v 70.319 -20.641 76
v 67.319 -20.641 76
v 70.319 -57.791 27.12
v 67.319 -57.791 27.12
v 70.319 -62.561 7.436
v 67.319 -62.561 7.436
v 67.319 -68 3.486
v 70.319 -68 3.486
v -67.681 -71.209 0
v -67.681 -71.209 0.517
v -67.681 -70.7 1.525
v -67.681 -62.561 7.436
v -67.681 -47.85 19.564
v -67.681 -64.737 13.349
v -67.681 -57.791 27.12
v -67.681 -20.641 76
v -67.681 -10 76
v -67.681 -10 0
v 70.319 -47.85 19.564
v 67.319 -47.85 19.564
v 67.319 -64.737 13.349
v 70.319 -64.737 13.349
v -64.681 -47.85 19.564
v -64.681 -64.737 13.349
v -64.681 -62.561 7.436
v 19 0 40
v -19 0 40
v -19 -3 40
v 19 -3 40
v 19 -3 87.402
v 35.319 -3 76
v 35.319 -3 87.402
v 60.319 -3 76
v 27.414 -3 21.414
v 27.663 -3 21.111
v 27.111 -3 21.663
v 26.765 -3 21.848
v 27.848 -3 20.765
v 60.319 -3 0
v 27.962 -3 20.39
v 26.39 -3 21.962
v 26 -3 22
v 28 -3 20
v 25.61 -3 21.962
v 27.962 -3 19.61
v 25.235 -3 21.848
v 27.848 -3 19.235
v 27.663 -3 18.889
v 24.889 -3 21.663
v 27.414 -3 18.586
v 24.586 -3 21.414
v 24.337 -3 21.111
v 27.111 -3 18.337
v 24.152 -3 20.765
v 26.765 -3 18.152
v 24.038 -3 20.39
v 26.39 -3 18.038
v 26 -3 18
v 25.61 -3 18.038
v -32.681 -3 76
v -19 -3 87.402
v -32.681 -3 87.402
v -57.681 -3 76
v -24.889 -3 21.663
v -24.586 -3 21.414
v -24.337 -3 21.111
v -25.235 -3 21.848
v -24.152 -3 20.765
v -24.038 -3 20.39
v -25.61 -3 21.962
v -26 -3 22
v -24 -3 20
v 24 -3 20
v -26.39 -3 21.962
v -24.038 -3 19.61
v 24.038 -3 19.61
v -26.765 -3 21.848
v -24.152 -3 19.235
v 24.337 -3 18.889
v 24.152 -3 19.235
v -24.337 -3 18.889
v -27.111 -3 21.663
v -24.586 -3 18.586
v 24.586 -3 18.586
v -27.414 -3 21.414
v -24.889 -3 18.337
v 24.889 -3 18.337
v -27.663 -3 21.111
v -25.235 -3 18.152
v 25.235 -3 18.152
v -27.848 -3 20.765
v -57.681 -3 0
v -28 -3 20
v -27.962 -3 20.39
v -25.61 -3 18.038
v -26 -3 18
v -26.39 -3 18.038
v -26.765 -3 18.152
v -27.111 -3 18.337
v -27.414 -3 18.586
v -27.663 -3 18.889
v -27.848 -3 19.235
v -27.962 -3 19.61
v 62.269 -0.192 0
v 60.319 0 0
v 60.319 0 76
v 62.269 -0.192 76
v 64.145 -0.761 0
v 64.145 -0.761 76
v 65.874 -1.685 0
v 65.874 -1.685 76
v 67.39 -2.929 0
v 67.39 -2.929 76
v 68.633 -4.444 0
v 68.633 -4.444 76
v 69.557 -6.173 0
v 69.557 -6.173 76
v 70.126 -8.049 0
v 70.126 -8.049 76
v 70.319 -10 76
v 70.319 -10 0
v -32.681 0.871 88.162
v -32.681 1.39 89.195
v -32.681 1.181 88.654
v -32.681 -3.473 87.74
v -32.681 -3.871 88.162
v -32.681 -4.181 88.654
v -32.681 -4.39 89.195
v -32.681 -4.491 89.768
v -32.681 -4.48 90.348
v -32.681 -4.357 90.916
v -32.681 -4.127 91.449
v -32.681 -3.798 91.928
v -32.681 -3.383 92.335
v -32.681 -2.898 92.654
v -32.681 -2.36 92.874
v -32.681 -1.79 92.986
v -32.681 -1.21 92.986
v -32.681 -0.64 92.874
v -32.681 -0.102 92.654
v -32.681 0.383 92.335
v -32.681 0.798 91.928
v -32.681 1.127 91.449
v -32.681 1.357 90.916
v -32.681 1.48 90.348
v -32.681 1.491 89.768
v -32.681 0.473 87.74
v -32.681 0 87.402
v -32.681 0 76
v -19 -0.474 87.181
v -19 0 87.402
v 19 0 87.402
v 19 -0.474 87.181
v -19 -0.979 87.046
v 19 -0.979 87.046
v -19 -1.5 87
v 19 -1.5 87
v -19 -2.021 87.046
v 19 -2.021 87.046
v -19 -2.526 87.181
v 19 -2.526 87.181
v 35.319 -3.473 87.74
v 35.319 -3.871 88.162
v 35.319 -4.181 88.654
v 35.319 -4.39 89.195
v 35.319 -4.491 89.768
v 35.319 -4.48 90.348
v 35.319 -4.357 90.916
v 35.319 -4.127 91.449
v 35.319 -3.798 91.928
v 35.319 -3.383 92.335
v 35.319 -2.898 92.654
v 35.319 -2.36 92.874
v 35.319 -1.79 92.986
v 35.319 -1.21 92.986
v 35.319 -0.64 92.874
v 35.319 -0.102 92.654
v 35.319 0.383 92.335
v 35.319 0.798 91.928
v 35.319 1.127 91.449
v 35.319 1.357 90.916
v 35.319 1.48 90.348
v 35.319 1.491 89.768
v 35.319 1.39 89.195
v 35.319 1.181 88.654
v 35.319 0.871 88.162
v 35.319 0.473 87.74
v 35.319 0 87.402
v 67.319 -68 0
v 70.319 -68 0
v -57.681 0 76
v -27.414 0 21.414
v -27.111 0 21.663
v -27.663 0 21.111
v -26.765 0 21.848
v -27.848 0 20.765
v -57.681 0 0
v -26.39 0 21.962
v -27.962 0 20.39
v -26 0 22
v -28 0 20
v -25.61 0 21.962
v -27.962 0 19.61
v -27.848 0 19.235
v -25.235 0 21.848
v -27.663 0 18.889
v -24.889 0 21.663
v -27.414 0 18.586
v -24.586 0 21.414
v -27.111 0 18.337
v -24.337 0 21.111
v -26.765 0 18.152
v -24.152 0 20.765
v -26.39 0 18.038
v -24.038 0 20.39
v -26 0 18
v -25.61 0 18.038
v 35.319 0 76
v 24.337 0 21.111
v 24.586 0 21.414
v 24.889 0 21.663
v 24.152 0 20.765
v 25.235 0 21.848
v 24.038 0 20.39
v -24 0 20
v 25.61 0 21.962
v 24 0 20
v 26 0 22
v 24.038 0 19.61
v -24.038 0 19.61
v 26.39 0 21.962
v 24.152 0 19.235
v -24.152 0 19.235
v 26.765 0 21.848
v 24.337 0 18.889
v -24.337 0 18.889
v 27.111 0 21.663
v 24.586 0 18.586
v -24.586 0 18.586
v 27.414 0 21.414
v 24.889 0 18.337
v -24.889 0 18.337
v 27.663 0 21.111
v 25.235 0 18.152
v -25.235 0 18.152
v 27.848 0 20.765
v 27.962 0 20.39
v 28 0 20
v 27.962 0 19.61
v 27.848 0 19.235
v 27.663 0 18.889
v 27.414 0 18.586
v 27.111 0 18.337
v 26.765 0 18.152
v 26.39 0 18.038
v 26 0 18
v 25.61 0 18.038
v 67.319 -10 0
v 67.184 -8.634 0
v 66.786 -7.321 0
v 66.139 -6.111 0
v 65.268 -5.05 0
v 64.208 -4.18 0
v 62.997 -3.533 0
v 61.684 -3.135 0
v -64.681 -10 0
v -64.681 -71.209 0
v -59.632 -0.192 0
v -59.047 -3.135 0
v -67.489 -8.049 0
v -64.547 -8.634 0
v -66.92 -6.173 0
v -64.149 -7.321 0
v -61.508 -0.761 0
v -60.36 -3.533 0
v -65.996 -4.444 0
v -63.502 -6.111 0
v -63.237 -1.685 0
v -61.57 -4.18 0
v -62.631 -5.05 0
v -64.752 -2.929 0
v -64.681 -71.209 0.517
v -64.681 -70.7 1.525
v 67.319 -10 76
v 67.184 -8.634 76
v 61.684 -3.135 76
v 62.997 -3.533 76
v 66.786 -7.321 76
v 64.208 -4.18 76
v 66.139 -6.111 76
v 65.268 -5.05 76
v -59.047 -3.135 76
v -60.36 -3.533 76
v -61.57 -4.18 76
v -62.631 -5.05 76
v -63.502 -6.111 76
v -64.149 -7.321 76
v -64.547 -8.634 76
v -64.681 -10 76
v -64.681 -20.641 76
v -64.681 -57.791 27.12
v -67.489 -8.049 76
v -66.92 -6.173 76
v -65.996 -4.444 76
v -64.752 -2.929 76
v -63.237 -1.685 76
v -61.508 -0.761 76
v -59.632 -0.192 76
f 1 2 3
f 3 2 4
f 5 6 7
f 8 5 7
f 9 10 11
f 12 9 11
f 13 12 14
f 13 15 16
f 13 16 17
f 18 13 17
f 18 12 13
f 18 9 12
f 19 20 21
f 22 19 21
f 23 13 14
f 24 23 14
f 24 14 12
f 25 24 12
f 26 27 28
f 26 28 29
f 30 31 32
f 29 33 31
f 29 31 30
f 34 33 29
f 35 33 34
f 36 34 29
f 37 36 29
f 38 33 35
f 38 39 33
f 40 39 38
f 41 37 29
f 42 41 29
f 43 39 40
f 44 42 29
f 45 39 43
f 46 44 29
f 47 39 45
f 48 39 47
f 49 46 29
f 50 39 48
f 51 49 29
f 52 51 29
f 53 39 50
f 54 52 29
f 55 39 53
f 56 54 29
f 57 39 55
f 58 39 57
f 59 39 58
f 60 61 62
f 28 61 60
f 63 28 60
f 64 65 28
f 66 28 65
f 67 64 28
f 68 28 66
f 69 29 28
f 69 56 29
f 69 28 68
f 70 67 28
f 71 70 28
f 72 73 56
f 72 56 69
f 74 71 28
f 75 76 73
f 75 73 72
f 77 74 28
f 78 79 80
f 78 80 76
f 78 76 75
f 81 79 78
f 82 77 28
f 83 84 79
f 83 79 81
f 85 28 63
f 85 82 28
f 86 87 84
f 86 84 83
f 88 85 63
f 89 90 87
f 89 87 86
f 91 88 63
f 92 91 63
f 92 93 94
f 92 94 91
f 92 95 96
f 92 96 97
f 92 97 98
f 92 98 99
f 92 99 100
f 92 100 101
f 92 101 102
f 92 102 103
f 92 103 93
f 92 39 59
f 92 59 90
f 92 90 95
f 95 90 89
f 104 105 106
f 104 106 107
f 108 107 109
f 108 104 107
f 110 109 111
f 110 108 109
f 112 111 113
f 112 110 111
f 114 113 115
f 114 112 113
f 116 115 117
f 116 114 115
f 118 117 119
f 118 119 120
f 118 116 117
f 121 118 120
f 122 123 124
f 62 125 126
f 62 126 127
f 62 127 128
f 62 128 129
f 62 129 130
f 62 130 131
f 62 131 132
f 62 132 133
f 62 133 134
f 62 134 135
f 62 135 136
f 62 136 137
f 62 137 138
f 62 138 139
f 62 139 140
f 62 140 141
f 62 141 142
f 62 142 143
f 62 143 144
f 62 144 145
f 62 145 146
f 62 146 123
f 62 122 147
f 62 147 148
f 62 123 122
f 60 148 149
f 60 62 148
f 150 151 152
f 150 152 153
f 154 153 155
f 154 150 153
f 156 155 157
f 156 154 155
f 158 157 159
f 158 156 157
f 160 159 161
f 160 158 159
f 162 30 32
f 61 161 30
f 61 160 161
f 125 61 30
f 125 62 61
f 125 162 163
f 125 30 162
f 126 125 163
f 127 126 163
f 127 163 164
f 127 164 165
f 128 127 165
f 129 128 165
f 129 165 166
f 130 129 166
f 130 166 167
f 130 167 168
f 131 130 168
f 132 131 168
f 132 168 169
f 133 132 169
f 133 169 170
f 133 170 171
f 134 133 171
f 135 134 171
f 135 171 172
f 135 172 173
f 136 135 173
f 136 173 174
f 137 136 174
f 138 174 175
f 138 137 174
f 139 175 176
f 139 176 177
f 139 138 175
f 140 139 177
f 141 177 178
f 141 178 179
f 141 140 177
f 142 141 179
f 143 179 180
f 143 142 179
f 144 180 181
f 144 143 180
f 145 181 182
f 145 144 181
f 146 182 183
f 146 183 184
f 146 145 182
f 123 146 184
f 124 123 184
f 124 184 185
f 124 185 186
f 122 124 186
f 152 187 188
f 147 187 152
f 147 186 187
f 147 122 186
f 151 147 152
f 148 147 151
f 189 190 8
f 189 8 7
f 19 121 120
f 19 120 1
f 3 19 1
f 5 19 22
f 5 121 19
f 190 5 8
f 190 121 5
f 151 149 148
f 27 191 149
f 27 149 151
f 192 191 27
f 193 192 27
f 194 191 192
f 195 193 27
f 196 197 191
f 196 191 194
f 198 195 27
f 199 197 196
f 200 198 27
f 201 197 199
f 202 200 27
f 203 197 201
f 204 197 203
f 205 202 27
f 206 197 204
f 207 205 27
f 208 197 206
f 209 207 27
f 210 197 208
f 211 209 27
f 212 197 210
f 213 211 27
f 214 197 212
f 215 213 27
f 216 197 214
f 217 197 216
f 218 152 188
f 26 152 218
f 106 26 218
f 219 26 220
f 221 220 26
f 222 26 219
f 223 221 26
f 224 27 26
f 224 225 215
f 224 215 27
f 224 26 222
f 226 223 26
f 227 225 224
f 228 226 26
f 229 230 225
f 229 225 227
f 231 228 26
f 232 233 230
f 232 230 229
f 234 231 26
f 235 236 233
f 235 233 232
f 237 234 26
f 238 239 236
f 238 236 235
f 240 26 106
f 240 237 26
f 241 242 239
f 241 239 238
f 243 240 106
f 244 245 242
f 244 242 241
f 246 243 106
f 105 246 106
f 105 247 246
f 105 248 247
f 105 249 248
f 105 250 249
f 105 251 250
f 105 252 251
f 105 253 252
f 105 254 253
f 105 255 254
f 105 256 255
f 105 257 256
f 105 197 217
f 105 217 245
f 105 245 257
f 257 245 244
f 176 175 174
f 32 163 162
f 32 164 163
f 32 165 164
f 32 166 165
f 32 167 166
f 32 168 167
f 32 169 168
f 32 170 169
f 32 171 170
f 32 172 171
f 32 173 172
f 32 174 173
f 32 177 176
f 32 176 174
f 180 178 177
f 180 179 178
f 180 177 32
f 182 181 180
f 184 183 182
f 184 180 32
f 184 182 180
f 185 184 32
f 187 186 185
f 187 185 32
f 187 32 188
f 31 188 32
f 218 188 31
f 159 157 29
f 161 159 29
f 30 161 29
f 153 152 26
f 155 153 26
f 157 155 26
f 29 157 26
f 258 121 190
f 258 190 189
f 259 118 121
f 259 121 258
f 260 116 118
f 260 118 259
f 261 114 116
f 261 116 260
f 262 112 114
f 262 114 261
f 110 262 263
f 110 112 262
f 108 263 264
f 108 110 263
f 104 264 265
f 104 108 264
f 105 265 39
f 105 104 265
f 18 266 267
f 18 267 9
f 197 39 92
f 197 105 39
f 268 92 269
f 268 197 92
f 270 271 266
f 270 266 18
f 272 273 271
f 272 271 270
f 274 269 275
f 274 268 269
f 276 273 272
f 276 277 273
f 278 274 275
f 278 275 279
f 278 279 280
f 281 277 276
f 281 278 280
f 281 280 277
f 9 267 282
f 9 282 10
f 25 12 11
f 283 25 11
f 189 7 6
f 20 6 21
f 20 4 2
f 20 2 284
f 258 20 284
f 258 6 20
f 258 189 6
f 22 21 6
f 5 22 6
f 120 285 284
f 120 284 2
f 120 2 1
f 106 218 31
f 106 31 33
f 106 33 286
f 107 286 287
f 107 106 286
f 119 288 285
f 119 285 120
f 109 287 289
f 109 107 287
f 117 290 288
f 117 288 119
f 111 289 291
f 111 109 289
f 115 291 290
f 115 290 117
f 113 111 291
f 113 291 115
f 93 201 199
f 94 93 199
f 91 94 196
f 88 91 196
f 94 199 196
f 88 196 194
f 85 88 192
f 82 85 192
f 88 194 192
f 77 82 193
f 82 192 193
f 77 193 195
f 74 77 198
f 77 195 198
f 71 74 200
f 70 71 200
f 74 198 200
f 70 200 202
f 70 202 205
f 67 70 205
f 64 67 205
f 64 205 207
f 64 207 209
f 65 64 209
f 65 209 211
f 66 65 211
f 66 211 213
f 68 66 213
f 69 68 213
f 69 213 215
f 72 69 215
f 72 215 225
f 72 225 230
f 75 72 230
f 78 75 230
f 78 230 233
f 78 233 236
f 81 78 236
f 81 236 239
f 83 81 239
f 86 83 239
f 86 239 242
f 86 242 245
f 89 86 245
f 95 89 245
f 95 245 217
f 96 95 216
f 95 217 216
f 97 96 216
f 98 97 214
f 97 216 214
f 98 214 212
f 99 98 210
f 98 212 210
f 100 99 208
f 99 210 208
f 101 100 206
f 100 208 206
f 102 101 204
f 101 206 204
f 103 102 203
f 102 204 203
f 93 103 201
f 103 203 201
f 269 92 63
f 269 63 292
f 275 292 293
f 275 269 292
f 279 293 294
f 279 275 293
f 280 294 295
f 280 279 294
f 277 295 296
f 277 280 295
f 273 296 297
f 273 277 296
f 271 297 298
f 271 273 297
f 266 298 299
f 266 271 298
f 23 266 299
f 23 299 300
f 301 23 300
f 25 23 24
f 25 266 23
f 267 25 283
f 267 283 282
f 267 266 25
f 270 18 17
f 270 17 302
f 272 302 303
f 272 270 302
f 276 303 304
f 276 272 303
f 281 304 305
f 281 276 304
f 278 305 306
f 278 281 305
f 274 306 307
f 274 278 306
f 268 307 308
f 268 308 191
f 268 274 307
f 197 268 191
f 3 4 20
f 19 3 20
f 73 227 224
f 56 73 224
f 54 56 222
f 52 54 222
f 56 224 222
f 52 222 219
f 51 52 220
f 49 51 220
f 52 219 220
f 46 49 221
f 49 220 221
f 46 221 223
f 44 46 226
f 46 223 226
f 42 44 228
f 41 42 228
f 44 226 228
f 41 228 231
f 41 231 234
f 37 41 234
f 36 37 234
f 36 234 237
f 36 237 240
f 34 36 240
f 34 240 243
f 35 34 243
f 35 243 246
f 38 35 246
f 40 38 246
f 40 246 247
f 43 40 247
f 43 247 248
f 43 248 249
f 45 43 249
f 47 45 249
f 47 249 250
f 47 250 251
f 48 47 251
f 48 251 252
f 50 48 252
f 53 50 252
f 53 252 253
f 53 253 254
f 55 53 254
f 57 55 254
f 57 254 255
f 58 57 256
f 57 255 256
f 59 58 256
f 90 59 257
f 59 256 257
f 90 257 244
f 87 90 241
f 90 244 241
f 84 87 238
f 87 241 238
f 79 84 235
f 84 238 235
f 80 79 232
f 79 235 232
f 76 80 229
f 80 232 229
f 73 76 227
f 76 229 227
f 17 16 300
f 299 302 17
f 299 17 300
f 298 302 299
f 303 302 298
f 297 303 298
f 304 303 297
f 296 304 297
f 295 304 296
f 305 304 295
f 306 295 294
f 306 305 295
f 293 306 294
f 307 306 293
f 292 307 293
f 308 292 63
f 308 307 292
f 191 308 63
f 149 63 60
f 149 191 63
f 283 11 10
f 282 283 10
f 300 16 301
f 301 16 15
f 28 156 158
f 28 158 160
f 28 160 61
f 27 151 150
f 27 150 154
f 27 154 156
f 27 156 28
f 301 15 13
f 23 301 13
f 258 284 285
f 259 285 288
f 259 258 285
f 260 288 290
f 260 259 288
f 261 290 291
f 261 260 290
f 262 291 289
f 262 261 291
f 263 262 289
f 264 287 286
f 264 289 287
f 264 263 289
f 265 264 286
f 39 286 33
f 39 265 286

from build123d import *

# Parameters (mm, degrees)
EXTRUDE_THIN1_DEPTH = 90
CUT_EXTRUDE1_DEPTH  = 180.484492174
SKETCH3_R           = 2
SKETCH3_W           = 35
SKETCH3_H           = 14
SKETCH3_W_2         = 38
SKETCH3_H_2         = 50
CUT_EXTRUDE2_DEPTH  = 135.593407947
BOSS_EXTRUDE1_REACH = 156.207
SKETCH4_R           = 3


with BuildPart() as part:
    # Sketch1 → Extrude-Thin1 (new body)
    with BuildSketch(Plane.XY):
        with BuildLine():
            Line((-67.681421148, -71.208727913), (-67.681421148, -10))
            ThreePointArc((-67.681421148, -10), (-64.75248896, -2.928932188), (-57.681421148, 0))
            Line((-57.681421148, 0), (60.318578852, 0))
            ThreePointArc((60.318578852, 0), (67.389646664, -2.928932188), (70.318578852, -10))
            Line((70.318578852, -10), (70.318578852, -68))
            Line((70.318578852, -68), (67.318578852, -68))
            Line((67.318578852, -68), (67.318578852, -10))
            ThreePointArc((67.318578852, -10), (65.268326321, -5.050252532), (60.318578852, -3))
            Line((60.318578852, -3), (-57.681421148, -3))
            ThreePointArc((-57.681421148, -3), (-62.631168616, -5.050252532), (-64.681421148, -10))
            Line((-64.681421148, -10), (-64.681421148, -71.208727913))
            Line((-64.681421148, -71.208727913), (-67.681421148, -71.208727913))
        make_face()
    extrude(amount=EXTRUDE_THIN1_DEPTH)

    # Sketch2 → Cut-Extrude1 (cut, through all)
    with BuildSketch(Plane.ZY.offset(67.681421148)):
        Polygon((90, -71.208727913), (90, -10), (27.119645112, -57.791474126), (19.564108931, -47.850479311), (13.348687597, -64.736940064), (7.43570584, -62.560541261), (1.525048388, -70.700264204), (0, -71.469431607), align=None)
    extrude(amount=-CUT_EXTRUDE1_DEPTH, mode=Mode.SUBTRACT)

    # Sketch3 → Cut-Extrude2 (cut, through all)
    with BuildSketch(Plane(origin=(0, 0, 0), x_dir=(1, 0, 0), z_dir=(0, 1, 0))):
        with Locations(Location((26, -20, 0), (0, 0, 180))):
            Circle(SKETCH3_R)
        with Locations(Location((-26, -20, 0), (0, 0, 180))):
            Circle(SKETCH3_R)
        with Locations((52.818578852, -83)):
            Rectangle(SKETCH3_W, SKETCH3_H)
        with Locations((-50.181421148, -83)):
            Rectangle(SKETCH3_W, SKETCH3_H)
        with Locations((0, -65)):
            Rectangle(SKETCH3_W_2, SKETCH3_H_2)
    extrude(amount=-CUT_EXTRUDE2_DEPTH, mode=Mode.SUBTRACT)

    # Boss-Extrude1: up to this face of the body (flat: up to its plane)
    boss_extrude1_end = Plane(part.part.faces().sort_by_distance((35.318578852, -1.5, 83))[0])
    # Sketch4 → Boss-Extrude1 (add, up to the picked face)
    with BuildSketch(Plane.ZY.offset(32.681421148), mode=Mode.PRIVATE) as boss_extrude1_sk1:
        with Locations(Location((90, -1.5, 0), (0, 0, 150))):
            Circle(SKETCH4_R)
    boss_extrude1_tool1 = split(extrude(boss_extrude1_sk1.sketch, amount=-BOSS_EXTRUDE1_REACH, mode=Mode.PRIVATE), bisect_by=boss_extrude1_end, keep=Keep.BOTH, mode=Mode.PRIVATE)
    add(boss_extrude1_tool1.solids().sort_by(Axis((-32.681421, -1.5, 90), (1, 0, 0)))[0])


solid = part.part
